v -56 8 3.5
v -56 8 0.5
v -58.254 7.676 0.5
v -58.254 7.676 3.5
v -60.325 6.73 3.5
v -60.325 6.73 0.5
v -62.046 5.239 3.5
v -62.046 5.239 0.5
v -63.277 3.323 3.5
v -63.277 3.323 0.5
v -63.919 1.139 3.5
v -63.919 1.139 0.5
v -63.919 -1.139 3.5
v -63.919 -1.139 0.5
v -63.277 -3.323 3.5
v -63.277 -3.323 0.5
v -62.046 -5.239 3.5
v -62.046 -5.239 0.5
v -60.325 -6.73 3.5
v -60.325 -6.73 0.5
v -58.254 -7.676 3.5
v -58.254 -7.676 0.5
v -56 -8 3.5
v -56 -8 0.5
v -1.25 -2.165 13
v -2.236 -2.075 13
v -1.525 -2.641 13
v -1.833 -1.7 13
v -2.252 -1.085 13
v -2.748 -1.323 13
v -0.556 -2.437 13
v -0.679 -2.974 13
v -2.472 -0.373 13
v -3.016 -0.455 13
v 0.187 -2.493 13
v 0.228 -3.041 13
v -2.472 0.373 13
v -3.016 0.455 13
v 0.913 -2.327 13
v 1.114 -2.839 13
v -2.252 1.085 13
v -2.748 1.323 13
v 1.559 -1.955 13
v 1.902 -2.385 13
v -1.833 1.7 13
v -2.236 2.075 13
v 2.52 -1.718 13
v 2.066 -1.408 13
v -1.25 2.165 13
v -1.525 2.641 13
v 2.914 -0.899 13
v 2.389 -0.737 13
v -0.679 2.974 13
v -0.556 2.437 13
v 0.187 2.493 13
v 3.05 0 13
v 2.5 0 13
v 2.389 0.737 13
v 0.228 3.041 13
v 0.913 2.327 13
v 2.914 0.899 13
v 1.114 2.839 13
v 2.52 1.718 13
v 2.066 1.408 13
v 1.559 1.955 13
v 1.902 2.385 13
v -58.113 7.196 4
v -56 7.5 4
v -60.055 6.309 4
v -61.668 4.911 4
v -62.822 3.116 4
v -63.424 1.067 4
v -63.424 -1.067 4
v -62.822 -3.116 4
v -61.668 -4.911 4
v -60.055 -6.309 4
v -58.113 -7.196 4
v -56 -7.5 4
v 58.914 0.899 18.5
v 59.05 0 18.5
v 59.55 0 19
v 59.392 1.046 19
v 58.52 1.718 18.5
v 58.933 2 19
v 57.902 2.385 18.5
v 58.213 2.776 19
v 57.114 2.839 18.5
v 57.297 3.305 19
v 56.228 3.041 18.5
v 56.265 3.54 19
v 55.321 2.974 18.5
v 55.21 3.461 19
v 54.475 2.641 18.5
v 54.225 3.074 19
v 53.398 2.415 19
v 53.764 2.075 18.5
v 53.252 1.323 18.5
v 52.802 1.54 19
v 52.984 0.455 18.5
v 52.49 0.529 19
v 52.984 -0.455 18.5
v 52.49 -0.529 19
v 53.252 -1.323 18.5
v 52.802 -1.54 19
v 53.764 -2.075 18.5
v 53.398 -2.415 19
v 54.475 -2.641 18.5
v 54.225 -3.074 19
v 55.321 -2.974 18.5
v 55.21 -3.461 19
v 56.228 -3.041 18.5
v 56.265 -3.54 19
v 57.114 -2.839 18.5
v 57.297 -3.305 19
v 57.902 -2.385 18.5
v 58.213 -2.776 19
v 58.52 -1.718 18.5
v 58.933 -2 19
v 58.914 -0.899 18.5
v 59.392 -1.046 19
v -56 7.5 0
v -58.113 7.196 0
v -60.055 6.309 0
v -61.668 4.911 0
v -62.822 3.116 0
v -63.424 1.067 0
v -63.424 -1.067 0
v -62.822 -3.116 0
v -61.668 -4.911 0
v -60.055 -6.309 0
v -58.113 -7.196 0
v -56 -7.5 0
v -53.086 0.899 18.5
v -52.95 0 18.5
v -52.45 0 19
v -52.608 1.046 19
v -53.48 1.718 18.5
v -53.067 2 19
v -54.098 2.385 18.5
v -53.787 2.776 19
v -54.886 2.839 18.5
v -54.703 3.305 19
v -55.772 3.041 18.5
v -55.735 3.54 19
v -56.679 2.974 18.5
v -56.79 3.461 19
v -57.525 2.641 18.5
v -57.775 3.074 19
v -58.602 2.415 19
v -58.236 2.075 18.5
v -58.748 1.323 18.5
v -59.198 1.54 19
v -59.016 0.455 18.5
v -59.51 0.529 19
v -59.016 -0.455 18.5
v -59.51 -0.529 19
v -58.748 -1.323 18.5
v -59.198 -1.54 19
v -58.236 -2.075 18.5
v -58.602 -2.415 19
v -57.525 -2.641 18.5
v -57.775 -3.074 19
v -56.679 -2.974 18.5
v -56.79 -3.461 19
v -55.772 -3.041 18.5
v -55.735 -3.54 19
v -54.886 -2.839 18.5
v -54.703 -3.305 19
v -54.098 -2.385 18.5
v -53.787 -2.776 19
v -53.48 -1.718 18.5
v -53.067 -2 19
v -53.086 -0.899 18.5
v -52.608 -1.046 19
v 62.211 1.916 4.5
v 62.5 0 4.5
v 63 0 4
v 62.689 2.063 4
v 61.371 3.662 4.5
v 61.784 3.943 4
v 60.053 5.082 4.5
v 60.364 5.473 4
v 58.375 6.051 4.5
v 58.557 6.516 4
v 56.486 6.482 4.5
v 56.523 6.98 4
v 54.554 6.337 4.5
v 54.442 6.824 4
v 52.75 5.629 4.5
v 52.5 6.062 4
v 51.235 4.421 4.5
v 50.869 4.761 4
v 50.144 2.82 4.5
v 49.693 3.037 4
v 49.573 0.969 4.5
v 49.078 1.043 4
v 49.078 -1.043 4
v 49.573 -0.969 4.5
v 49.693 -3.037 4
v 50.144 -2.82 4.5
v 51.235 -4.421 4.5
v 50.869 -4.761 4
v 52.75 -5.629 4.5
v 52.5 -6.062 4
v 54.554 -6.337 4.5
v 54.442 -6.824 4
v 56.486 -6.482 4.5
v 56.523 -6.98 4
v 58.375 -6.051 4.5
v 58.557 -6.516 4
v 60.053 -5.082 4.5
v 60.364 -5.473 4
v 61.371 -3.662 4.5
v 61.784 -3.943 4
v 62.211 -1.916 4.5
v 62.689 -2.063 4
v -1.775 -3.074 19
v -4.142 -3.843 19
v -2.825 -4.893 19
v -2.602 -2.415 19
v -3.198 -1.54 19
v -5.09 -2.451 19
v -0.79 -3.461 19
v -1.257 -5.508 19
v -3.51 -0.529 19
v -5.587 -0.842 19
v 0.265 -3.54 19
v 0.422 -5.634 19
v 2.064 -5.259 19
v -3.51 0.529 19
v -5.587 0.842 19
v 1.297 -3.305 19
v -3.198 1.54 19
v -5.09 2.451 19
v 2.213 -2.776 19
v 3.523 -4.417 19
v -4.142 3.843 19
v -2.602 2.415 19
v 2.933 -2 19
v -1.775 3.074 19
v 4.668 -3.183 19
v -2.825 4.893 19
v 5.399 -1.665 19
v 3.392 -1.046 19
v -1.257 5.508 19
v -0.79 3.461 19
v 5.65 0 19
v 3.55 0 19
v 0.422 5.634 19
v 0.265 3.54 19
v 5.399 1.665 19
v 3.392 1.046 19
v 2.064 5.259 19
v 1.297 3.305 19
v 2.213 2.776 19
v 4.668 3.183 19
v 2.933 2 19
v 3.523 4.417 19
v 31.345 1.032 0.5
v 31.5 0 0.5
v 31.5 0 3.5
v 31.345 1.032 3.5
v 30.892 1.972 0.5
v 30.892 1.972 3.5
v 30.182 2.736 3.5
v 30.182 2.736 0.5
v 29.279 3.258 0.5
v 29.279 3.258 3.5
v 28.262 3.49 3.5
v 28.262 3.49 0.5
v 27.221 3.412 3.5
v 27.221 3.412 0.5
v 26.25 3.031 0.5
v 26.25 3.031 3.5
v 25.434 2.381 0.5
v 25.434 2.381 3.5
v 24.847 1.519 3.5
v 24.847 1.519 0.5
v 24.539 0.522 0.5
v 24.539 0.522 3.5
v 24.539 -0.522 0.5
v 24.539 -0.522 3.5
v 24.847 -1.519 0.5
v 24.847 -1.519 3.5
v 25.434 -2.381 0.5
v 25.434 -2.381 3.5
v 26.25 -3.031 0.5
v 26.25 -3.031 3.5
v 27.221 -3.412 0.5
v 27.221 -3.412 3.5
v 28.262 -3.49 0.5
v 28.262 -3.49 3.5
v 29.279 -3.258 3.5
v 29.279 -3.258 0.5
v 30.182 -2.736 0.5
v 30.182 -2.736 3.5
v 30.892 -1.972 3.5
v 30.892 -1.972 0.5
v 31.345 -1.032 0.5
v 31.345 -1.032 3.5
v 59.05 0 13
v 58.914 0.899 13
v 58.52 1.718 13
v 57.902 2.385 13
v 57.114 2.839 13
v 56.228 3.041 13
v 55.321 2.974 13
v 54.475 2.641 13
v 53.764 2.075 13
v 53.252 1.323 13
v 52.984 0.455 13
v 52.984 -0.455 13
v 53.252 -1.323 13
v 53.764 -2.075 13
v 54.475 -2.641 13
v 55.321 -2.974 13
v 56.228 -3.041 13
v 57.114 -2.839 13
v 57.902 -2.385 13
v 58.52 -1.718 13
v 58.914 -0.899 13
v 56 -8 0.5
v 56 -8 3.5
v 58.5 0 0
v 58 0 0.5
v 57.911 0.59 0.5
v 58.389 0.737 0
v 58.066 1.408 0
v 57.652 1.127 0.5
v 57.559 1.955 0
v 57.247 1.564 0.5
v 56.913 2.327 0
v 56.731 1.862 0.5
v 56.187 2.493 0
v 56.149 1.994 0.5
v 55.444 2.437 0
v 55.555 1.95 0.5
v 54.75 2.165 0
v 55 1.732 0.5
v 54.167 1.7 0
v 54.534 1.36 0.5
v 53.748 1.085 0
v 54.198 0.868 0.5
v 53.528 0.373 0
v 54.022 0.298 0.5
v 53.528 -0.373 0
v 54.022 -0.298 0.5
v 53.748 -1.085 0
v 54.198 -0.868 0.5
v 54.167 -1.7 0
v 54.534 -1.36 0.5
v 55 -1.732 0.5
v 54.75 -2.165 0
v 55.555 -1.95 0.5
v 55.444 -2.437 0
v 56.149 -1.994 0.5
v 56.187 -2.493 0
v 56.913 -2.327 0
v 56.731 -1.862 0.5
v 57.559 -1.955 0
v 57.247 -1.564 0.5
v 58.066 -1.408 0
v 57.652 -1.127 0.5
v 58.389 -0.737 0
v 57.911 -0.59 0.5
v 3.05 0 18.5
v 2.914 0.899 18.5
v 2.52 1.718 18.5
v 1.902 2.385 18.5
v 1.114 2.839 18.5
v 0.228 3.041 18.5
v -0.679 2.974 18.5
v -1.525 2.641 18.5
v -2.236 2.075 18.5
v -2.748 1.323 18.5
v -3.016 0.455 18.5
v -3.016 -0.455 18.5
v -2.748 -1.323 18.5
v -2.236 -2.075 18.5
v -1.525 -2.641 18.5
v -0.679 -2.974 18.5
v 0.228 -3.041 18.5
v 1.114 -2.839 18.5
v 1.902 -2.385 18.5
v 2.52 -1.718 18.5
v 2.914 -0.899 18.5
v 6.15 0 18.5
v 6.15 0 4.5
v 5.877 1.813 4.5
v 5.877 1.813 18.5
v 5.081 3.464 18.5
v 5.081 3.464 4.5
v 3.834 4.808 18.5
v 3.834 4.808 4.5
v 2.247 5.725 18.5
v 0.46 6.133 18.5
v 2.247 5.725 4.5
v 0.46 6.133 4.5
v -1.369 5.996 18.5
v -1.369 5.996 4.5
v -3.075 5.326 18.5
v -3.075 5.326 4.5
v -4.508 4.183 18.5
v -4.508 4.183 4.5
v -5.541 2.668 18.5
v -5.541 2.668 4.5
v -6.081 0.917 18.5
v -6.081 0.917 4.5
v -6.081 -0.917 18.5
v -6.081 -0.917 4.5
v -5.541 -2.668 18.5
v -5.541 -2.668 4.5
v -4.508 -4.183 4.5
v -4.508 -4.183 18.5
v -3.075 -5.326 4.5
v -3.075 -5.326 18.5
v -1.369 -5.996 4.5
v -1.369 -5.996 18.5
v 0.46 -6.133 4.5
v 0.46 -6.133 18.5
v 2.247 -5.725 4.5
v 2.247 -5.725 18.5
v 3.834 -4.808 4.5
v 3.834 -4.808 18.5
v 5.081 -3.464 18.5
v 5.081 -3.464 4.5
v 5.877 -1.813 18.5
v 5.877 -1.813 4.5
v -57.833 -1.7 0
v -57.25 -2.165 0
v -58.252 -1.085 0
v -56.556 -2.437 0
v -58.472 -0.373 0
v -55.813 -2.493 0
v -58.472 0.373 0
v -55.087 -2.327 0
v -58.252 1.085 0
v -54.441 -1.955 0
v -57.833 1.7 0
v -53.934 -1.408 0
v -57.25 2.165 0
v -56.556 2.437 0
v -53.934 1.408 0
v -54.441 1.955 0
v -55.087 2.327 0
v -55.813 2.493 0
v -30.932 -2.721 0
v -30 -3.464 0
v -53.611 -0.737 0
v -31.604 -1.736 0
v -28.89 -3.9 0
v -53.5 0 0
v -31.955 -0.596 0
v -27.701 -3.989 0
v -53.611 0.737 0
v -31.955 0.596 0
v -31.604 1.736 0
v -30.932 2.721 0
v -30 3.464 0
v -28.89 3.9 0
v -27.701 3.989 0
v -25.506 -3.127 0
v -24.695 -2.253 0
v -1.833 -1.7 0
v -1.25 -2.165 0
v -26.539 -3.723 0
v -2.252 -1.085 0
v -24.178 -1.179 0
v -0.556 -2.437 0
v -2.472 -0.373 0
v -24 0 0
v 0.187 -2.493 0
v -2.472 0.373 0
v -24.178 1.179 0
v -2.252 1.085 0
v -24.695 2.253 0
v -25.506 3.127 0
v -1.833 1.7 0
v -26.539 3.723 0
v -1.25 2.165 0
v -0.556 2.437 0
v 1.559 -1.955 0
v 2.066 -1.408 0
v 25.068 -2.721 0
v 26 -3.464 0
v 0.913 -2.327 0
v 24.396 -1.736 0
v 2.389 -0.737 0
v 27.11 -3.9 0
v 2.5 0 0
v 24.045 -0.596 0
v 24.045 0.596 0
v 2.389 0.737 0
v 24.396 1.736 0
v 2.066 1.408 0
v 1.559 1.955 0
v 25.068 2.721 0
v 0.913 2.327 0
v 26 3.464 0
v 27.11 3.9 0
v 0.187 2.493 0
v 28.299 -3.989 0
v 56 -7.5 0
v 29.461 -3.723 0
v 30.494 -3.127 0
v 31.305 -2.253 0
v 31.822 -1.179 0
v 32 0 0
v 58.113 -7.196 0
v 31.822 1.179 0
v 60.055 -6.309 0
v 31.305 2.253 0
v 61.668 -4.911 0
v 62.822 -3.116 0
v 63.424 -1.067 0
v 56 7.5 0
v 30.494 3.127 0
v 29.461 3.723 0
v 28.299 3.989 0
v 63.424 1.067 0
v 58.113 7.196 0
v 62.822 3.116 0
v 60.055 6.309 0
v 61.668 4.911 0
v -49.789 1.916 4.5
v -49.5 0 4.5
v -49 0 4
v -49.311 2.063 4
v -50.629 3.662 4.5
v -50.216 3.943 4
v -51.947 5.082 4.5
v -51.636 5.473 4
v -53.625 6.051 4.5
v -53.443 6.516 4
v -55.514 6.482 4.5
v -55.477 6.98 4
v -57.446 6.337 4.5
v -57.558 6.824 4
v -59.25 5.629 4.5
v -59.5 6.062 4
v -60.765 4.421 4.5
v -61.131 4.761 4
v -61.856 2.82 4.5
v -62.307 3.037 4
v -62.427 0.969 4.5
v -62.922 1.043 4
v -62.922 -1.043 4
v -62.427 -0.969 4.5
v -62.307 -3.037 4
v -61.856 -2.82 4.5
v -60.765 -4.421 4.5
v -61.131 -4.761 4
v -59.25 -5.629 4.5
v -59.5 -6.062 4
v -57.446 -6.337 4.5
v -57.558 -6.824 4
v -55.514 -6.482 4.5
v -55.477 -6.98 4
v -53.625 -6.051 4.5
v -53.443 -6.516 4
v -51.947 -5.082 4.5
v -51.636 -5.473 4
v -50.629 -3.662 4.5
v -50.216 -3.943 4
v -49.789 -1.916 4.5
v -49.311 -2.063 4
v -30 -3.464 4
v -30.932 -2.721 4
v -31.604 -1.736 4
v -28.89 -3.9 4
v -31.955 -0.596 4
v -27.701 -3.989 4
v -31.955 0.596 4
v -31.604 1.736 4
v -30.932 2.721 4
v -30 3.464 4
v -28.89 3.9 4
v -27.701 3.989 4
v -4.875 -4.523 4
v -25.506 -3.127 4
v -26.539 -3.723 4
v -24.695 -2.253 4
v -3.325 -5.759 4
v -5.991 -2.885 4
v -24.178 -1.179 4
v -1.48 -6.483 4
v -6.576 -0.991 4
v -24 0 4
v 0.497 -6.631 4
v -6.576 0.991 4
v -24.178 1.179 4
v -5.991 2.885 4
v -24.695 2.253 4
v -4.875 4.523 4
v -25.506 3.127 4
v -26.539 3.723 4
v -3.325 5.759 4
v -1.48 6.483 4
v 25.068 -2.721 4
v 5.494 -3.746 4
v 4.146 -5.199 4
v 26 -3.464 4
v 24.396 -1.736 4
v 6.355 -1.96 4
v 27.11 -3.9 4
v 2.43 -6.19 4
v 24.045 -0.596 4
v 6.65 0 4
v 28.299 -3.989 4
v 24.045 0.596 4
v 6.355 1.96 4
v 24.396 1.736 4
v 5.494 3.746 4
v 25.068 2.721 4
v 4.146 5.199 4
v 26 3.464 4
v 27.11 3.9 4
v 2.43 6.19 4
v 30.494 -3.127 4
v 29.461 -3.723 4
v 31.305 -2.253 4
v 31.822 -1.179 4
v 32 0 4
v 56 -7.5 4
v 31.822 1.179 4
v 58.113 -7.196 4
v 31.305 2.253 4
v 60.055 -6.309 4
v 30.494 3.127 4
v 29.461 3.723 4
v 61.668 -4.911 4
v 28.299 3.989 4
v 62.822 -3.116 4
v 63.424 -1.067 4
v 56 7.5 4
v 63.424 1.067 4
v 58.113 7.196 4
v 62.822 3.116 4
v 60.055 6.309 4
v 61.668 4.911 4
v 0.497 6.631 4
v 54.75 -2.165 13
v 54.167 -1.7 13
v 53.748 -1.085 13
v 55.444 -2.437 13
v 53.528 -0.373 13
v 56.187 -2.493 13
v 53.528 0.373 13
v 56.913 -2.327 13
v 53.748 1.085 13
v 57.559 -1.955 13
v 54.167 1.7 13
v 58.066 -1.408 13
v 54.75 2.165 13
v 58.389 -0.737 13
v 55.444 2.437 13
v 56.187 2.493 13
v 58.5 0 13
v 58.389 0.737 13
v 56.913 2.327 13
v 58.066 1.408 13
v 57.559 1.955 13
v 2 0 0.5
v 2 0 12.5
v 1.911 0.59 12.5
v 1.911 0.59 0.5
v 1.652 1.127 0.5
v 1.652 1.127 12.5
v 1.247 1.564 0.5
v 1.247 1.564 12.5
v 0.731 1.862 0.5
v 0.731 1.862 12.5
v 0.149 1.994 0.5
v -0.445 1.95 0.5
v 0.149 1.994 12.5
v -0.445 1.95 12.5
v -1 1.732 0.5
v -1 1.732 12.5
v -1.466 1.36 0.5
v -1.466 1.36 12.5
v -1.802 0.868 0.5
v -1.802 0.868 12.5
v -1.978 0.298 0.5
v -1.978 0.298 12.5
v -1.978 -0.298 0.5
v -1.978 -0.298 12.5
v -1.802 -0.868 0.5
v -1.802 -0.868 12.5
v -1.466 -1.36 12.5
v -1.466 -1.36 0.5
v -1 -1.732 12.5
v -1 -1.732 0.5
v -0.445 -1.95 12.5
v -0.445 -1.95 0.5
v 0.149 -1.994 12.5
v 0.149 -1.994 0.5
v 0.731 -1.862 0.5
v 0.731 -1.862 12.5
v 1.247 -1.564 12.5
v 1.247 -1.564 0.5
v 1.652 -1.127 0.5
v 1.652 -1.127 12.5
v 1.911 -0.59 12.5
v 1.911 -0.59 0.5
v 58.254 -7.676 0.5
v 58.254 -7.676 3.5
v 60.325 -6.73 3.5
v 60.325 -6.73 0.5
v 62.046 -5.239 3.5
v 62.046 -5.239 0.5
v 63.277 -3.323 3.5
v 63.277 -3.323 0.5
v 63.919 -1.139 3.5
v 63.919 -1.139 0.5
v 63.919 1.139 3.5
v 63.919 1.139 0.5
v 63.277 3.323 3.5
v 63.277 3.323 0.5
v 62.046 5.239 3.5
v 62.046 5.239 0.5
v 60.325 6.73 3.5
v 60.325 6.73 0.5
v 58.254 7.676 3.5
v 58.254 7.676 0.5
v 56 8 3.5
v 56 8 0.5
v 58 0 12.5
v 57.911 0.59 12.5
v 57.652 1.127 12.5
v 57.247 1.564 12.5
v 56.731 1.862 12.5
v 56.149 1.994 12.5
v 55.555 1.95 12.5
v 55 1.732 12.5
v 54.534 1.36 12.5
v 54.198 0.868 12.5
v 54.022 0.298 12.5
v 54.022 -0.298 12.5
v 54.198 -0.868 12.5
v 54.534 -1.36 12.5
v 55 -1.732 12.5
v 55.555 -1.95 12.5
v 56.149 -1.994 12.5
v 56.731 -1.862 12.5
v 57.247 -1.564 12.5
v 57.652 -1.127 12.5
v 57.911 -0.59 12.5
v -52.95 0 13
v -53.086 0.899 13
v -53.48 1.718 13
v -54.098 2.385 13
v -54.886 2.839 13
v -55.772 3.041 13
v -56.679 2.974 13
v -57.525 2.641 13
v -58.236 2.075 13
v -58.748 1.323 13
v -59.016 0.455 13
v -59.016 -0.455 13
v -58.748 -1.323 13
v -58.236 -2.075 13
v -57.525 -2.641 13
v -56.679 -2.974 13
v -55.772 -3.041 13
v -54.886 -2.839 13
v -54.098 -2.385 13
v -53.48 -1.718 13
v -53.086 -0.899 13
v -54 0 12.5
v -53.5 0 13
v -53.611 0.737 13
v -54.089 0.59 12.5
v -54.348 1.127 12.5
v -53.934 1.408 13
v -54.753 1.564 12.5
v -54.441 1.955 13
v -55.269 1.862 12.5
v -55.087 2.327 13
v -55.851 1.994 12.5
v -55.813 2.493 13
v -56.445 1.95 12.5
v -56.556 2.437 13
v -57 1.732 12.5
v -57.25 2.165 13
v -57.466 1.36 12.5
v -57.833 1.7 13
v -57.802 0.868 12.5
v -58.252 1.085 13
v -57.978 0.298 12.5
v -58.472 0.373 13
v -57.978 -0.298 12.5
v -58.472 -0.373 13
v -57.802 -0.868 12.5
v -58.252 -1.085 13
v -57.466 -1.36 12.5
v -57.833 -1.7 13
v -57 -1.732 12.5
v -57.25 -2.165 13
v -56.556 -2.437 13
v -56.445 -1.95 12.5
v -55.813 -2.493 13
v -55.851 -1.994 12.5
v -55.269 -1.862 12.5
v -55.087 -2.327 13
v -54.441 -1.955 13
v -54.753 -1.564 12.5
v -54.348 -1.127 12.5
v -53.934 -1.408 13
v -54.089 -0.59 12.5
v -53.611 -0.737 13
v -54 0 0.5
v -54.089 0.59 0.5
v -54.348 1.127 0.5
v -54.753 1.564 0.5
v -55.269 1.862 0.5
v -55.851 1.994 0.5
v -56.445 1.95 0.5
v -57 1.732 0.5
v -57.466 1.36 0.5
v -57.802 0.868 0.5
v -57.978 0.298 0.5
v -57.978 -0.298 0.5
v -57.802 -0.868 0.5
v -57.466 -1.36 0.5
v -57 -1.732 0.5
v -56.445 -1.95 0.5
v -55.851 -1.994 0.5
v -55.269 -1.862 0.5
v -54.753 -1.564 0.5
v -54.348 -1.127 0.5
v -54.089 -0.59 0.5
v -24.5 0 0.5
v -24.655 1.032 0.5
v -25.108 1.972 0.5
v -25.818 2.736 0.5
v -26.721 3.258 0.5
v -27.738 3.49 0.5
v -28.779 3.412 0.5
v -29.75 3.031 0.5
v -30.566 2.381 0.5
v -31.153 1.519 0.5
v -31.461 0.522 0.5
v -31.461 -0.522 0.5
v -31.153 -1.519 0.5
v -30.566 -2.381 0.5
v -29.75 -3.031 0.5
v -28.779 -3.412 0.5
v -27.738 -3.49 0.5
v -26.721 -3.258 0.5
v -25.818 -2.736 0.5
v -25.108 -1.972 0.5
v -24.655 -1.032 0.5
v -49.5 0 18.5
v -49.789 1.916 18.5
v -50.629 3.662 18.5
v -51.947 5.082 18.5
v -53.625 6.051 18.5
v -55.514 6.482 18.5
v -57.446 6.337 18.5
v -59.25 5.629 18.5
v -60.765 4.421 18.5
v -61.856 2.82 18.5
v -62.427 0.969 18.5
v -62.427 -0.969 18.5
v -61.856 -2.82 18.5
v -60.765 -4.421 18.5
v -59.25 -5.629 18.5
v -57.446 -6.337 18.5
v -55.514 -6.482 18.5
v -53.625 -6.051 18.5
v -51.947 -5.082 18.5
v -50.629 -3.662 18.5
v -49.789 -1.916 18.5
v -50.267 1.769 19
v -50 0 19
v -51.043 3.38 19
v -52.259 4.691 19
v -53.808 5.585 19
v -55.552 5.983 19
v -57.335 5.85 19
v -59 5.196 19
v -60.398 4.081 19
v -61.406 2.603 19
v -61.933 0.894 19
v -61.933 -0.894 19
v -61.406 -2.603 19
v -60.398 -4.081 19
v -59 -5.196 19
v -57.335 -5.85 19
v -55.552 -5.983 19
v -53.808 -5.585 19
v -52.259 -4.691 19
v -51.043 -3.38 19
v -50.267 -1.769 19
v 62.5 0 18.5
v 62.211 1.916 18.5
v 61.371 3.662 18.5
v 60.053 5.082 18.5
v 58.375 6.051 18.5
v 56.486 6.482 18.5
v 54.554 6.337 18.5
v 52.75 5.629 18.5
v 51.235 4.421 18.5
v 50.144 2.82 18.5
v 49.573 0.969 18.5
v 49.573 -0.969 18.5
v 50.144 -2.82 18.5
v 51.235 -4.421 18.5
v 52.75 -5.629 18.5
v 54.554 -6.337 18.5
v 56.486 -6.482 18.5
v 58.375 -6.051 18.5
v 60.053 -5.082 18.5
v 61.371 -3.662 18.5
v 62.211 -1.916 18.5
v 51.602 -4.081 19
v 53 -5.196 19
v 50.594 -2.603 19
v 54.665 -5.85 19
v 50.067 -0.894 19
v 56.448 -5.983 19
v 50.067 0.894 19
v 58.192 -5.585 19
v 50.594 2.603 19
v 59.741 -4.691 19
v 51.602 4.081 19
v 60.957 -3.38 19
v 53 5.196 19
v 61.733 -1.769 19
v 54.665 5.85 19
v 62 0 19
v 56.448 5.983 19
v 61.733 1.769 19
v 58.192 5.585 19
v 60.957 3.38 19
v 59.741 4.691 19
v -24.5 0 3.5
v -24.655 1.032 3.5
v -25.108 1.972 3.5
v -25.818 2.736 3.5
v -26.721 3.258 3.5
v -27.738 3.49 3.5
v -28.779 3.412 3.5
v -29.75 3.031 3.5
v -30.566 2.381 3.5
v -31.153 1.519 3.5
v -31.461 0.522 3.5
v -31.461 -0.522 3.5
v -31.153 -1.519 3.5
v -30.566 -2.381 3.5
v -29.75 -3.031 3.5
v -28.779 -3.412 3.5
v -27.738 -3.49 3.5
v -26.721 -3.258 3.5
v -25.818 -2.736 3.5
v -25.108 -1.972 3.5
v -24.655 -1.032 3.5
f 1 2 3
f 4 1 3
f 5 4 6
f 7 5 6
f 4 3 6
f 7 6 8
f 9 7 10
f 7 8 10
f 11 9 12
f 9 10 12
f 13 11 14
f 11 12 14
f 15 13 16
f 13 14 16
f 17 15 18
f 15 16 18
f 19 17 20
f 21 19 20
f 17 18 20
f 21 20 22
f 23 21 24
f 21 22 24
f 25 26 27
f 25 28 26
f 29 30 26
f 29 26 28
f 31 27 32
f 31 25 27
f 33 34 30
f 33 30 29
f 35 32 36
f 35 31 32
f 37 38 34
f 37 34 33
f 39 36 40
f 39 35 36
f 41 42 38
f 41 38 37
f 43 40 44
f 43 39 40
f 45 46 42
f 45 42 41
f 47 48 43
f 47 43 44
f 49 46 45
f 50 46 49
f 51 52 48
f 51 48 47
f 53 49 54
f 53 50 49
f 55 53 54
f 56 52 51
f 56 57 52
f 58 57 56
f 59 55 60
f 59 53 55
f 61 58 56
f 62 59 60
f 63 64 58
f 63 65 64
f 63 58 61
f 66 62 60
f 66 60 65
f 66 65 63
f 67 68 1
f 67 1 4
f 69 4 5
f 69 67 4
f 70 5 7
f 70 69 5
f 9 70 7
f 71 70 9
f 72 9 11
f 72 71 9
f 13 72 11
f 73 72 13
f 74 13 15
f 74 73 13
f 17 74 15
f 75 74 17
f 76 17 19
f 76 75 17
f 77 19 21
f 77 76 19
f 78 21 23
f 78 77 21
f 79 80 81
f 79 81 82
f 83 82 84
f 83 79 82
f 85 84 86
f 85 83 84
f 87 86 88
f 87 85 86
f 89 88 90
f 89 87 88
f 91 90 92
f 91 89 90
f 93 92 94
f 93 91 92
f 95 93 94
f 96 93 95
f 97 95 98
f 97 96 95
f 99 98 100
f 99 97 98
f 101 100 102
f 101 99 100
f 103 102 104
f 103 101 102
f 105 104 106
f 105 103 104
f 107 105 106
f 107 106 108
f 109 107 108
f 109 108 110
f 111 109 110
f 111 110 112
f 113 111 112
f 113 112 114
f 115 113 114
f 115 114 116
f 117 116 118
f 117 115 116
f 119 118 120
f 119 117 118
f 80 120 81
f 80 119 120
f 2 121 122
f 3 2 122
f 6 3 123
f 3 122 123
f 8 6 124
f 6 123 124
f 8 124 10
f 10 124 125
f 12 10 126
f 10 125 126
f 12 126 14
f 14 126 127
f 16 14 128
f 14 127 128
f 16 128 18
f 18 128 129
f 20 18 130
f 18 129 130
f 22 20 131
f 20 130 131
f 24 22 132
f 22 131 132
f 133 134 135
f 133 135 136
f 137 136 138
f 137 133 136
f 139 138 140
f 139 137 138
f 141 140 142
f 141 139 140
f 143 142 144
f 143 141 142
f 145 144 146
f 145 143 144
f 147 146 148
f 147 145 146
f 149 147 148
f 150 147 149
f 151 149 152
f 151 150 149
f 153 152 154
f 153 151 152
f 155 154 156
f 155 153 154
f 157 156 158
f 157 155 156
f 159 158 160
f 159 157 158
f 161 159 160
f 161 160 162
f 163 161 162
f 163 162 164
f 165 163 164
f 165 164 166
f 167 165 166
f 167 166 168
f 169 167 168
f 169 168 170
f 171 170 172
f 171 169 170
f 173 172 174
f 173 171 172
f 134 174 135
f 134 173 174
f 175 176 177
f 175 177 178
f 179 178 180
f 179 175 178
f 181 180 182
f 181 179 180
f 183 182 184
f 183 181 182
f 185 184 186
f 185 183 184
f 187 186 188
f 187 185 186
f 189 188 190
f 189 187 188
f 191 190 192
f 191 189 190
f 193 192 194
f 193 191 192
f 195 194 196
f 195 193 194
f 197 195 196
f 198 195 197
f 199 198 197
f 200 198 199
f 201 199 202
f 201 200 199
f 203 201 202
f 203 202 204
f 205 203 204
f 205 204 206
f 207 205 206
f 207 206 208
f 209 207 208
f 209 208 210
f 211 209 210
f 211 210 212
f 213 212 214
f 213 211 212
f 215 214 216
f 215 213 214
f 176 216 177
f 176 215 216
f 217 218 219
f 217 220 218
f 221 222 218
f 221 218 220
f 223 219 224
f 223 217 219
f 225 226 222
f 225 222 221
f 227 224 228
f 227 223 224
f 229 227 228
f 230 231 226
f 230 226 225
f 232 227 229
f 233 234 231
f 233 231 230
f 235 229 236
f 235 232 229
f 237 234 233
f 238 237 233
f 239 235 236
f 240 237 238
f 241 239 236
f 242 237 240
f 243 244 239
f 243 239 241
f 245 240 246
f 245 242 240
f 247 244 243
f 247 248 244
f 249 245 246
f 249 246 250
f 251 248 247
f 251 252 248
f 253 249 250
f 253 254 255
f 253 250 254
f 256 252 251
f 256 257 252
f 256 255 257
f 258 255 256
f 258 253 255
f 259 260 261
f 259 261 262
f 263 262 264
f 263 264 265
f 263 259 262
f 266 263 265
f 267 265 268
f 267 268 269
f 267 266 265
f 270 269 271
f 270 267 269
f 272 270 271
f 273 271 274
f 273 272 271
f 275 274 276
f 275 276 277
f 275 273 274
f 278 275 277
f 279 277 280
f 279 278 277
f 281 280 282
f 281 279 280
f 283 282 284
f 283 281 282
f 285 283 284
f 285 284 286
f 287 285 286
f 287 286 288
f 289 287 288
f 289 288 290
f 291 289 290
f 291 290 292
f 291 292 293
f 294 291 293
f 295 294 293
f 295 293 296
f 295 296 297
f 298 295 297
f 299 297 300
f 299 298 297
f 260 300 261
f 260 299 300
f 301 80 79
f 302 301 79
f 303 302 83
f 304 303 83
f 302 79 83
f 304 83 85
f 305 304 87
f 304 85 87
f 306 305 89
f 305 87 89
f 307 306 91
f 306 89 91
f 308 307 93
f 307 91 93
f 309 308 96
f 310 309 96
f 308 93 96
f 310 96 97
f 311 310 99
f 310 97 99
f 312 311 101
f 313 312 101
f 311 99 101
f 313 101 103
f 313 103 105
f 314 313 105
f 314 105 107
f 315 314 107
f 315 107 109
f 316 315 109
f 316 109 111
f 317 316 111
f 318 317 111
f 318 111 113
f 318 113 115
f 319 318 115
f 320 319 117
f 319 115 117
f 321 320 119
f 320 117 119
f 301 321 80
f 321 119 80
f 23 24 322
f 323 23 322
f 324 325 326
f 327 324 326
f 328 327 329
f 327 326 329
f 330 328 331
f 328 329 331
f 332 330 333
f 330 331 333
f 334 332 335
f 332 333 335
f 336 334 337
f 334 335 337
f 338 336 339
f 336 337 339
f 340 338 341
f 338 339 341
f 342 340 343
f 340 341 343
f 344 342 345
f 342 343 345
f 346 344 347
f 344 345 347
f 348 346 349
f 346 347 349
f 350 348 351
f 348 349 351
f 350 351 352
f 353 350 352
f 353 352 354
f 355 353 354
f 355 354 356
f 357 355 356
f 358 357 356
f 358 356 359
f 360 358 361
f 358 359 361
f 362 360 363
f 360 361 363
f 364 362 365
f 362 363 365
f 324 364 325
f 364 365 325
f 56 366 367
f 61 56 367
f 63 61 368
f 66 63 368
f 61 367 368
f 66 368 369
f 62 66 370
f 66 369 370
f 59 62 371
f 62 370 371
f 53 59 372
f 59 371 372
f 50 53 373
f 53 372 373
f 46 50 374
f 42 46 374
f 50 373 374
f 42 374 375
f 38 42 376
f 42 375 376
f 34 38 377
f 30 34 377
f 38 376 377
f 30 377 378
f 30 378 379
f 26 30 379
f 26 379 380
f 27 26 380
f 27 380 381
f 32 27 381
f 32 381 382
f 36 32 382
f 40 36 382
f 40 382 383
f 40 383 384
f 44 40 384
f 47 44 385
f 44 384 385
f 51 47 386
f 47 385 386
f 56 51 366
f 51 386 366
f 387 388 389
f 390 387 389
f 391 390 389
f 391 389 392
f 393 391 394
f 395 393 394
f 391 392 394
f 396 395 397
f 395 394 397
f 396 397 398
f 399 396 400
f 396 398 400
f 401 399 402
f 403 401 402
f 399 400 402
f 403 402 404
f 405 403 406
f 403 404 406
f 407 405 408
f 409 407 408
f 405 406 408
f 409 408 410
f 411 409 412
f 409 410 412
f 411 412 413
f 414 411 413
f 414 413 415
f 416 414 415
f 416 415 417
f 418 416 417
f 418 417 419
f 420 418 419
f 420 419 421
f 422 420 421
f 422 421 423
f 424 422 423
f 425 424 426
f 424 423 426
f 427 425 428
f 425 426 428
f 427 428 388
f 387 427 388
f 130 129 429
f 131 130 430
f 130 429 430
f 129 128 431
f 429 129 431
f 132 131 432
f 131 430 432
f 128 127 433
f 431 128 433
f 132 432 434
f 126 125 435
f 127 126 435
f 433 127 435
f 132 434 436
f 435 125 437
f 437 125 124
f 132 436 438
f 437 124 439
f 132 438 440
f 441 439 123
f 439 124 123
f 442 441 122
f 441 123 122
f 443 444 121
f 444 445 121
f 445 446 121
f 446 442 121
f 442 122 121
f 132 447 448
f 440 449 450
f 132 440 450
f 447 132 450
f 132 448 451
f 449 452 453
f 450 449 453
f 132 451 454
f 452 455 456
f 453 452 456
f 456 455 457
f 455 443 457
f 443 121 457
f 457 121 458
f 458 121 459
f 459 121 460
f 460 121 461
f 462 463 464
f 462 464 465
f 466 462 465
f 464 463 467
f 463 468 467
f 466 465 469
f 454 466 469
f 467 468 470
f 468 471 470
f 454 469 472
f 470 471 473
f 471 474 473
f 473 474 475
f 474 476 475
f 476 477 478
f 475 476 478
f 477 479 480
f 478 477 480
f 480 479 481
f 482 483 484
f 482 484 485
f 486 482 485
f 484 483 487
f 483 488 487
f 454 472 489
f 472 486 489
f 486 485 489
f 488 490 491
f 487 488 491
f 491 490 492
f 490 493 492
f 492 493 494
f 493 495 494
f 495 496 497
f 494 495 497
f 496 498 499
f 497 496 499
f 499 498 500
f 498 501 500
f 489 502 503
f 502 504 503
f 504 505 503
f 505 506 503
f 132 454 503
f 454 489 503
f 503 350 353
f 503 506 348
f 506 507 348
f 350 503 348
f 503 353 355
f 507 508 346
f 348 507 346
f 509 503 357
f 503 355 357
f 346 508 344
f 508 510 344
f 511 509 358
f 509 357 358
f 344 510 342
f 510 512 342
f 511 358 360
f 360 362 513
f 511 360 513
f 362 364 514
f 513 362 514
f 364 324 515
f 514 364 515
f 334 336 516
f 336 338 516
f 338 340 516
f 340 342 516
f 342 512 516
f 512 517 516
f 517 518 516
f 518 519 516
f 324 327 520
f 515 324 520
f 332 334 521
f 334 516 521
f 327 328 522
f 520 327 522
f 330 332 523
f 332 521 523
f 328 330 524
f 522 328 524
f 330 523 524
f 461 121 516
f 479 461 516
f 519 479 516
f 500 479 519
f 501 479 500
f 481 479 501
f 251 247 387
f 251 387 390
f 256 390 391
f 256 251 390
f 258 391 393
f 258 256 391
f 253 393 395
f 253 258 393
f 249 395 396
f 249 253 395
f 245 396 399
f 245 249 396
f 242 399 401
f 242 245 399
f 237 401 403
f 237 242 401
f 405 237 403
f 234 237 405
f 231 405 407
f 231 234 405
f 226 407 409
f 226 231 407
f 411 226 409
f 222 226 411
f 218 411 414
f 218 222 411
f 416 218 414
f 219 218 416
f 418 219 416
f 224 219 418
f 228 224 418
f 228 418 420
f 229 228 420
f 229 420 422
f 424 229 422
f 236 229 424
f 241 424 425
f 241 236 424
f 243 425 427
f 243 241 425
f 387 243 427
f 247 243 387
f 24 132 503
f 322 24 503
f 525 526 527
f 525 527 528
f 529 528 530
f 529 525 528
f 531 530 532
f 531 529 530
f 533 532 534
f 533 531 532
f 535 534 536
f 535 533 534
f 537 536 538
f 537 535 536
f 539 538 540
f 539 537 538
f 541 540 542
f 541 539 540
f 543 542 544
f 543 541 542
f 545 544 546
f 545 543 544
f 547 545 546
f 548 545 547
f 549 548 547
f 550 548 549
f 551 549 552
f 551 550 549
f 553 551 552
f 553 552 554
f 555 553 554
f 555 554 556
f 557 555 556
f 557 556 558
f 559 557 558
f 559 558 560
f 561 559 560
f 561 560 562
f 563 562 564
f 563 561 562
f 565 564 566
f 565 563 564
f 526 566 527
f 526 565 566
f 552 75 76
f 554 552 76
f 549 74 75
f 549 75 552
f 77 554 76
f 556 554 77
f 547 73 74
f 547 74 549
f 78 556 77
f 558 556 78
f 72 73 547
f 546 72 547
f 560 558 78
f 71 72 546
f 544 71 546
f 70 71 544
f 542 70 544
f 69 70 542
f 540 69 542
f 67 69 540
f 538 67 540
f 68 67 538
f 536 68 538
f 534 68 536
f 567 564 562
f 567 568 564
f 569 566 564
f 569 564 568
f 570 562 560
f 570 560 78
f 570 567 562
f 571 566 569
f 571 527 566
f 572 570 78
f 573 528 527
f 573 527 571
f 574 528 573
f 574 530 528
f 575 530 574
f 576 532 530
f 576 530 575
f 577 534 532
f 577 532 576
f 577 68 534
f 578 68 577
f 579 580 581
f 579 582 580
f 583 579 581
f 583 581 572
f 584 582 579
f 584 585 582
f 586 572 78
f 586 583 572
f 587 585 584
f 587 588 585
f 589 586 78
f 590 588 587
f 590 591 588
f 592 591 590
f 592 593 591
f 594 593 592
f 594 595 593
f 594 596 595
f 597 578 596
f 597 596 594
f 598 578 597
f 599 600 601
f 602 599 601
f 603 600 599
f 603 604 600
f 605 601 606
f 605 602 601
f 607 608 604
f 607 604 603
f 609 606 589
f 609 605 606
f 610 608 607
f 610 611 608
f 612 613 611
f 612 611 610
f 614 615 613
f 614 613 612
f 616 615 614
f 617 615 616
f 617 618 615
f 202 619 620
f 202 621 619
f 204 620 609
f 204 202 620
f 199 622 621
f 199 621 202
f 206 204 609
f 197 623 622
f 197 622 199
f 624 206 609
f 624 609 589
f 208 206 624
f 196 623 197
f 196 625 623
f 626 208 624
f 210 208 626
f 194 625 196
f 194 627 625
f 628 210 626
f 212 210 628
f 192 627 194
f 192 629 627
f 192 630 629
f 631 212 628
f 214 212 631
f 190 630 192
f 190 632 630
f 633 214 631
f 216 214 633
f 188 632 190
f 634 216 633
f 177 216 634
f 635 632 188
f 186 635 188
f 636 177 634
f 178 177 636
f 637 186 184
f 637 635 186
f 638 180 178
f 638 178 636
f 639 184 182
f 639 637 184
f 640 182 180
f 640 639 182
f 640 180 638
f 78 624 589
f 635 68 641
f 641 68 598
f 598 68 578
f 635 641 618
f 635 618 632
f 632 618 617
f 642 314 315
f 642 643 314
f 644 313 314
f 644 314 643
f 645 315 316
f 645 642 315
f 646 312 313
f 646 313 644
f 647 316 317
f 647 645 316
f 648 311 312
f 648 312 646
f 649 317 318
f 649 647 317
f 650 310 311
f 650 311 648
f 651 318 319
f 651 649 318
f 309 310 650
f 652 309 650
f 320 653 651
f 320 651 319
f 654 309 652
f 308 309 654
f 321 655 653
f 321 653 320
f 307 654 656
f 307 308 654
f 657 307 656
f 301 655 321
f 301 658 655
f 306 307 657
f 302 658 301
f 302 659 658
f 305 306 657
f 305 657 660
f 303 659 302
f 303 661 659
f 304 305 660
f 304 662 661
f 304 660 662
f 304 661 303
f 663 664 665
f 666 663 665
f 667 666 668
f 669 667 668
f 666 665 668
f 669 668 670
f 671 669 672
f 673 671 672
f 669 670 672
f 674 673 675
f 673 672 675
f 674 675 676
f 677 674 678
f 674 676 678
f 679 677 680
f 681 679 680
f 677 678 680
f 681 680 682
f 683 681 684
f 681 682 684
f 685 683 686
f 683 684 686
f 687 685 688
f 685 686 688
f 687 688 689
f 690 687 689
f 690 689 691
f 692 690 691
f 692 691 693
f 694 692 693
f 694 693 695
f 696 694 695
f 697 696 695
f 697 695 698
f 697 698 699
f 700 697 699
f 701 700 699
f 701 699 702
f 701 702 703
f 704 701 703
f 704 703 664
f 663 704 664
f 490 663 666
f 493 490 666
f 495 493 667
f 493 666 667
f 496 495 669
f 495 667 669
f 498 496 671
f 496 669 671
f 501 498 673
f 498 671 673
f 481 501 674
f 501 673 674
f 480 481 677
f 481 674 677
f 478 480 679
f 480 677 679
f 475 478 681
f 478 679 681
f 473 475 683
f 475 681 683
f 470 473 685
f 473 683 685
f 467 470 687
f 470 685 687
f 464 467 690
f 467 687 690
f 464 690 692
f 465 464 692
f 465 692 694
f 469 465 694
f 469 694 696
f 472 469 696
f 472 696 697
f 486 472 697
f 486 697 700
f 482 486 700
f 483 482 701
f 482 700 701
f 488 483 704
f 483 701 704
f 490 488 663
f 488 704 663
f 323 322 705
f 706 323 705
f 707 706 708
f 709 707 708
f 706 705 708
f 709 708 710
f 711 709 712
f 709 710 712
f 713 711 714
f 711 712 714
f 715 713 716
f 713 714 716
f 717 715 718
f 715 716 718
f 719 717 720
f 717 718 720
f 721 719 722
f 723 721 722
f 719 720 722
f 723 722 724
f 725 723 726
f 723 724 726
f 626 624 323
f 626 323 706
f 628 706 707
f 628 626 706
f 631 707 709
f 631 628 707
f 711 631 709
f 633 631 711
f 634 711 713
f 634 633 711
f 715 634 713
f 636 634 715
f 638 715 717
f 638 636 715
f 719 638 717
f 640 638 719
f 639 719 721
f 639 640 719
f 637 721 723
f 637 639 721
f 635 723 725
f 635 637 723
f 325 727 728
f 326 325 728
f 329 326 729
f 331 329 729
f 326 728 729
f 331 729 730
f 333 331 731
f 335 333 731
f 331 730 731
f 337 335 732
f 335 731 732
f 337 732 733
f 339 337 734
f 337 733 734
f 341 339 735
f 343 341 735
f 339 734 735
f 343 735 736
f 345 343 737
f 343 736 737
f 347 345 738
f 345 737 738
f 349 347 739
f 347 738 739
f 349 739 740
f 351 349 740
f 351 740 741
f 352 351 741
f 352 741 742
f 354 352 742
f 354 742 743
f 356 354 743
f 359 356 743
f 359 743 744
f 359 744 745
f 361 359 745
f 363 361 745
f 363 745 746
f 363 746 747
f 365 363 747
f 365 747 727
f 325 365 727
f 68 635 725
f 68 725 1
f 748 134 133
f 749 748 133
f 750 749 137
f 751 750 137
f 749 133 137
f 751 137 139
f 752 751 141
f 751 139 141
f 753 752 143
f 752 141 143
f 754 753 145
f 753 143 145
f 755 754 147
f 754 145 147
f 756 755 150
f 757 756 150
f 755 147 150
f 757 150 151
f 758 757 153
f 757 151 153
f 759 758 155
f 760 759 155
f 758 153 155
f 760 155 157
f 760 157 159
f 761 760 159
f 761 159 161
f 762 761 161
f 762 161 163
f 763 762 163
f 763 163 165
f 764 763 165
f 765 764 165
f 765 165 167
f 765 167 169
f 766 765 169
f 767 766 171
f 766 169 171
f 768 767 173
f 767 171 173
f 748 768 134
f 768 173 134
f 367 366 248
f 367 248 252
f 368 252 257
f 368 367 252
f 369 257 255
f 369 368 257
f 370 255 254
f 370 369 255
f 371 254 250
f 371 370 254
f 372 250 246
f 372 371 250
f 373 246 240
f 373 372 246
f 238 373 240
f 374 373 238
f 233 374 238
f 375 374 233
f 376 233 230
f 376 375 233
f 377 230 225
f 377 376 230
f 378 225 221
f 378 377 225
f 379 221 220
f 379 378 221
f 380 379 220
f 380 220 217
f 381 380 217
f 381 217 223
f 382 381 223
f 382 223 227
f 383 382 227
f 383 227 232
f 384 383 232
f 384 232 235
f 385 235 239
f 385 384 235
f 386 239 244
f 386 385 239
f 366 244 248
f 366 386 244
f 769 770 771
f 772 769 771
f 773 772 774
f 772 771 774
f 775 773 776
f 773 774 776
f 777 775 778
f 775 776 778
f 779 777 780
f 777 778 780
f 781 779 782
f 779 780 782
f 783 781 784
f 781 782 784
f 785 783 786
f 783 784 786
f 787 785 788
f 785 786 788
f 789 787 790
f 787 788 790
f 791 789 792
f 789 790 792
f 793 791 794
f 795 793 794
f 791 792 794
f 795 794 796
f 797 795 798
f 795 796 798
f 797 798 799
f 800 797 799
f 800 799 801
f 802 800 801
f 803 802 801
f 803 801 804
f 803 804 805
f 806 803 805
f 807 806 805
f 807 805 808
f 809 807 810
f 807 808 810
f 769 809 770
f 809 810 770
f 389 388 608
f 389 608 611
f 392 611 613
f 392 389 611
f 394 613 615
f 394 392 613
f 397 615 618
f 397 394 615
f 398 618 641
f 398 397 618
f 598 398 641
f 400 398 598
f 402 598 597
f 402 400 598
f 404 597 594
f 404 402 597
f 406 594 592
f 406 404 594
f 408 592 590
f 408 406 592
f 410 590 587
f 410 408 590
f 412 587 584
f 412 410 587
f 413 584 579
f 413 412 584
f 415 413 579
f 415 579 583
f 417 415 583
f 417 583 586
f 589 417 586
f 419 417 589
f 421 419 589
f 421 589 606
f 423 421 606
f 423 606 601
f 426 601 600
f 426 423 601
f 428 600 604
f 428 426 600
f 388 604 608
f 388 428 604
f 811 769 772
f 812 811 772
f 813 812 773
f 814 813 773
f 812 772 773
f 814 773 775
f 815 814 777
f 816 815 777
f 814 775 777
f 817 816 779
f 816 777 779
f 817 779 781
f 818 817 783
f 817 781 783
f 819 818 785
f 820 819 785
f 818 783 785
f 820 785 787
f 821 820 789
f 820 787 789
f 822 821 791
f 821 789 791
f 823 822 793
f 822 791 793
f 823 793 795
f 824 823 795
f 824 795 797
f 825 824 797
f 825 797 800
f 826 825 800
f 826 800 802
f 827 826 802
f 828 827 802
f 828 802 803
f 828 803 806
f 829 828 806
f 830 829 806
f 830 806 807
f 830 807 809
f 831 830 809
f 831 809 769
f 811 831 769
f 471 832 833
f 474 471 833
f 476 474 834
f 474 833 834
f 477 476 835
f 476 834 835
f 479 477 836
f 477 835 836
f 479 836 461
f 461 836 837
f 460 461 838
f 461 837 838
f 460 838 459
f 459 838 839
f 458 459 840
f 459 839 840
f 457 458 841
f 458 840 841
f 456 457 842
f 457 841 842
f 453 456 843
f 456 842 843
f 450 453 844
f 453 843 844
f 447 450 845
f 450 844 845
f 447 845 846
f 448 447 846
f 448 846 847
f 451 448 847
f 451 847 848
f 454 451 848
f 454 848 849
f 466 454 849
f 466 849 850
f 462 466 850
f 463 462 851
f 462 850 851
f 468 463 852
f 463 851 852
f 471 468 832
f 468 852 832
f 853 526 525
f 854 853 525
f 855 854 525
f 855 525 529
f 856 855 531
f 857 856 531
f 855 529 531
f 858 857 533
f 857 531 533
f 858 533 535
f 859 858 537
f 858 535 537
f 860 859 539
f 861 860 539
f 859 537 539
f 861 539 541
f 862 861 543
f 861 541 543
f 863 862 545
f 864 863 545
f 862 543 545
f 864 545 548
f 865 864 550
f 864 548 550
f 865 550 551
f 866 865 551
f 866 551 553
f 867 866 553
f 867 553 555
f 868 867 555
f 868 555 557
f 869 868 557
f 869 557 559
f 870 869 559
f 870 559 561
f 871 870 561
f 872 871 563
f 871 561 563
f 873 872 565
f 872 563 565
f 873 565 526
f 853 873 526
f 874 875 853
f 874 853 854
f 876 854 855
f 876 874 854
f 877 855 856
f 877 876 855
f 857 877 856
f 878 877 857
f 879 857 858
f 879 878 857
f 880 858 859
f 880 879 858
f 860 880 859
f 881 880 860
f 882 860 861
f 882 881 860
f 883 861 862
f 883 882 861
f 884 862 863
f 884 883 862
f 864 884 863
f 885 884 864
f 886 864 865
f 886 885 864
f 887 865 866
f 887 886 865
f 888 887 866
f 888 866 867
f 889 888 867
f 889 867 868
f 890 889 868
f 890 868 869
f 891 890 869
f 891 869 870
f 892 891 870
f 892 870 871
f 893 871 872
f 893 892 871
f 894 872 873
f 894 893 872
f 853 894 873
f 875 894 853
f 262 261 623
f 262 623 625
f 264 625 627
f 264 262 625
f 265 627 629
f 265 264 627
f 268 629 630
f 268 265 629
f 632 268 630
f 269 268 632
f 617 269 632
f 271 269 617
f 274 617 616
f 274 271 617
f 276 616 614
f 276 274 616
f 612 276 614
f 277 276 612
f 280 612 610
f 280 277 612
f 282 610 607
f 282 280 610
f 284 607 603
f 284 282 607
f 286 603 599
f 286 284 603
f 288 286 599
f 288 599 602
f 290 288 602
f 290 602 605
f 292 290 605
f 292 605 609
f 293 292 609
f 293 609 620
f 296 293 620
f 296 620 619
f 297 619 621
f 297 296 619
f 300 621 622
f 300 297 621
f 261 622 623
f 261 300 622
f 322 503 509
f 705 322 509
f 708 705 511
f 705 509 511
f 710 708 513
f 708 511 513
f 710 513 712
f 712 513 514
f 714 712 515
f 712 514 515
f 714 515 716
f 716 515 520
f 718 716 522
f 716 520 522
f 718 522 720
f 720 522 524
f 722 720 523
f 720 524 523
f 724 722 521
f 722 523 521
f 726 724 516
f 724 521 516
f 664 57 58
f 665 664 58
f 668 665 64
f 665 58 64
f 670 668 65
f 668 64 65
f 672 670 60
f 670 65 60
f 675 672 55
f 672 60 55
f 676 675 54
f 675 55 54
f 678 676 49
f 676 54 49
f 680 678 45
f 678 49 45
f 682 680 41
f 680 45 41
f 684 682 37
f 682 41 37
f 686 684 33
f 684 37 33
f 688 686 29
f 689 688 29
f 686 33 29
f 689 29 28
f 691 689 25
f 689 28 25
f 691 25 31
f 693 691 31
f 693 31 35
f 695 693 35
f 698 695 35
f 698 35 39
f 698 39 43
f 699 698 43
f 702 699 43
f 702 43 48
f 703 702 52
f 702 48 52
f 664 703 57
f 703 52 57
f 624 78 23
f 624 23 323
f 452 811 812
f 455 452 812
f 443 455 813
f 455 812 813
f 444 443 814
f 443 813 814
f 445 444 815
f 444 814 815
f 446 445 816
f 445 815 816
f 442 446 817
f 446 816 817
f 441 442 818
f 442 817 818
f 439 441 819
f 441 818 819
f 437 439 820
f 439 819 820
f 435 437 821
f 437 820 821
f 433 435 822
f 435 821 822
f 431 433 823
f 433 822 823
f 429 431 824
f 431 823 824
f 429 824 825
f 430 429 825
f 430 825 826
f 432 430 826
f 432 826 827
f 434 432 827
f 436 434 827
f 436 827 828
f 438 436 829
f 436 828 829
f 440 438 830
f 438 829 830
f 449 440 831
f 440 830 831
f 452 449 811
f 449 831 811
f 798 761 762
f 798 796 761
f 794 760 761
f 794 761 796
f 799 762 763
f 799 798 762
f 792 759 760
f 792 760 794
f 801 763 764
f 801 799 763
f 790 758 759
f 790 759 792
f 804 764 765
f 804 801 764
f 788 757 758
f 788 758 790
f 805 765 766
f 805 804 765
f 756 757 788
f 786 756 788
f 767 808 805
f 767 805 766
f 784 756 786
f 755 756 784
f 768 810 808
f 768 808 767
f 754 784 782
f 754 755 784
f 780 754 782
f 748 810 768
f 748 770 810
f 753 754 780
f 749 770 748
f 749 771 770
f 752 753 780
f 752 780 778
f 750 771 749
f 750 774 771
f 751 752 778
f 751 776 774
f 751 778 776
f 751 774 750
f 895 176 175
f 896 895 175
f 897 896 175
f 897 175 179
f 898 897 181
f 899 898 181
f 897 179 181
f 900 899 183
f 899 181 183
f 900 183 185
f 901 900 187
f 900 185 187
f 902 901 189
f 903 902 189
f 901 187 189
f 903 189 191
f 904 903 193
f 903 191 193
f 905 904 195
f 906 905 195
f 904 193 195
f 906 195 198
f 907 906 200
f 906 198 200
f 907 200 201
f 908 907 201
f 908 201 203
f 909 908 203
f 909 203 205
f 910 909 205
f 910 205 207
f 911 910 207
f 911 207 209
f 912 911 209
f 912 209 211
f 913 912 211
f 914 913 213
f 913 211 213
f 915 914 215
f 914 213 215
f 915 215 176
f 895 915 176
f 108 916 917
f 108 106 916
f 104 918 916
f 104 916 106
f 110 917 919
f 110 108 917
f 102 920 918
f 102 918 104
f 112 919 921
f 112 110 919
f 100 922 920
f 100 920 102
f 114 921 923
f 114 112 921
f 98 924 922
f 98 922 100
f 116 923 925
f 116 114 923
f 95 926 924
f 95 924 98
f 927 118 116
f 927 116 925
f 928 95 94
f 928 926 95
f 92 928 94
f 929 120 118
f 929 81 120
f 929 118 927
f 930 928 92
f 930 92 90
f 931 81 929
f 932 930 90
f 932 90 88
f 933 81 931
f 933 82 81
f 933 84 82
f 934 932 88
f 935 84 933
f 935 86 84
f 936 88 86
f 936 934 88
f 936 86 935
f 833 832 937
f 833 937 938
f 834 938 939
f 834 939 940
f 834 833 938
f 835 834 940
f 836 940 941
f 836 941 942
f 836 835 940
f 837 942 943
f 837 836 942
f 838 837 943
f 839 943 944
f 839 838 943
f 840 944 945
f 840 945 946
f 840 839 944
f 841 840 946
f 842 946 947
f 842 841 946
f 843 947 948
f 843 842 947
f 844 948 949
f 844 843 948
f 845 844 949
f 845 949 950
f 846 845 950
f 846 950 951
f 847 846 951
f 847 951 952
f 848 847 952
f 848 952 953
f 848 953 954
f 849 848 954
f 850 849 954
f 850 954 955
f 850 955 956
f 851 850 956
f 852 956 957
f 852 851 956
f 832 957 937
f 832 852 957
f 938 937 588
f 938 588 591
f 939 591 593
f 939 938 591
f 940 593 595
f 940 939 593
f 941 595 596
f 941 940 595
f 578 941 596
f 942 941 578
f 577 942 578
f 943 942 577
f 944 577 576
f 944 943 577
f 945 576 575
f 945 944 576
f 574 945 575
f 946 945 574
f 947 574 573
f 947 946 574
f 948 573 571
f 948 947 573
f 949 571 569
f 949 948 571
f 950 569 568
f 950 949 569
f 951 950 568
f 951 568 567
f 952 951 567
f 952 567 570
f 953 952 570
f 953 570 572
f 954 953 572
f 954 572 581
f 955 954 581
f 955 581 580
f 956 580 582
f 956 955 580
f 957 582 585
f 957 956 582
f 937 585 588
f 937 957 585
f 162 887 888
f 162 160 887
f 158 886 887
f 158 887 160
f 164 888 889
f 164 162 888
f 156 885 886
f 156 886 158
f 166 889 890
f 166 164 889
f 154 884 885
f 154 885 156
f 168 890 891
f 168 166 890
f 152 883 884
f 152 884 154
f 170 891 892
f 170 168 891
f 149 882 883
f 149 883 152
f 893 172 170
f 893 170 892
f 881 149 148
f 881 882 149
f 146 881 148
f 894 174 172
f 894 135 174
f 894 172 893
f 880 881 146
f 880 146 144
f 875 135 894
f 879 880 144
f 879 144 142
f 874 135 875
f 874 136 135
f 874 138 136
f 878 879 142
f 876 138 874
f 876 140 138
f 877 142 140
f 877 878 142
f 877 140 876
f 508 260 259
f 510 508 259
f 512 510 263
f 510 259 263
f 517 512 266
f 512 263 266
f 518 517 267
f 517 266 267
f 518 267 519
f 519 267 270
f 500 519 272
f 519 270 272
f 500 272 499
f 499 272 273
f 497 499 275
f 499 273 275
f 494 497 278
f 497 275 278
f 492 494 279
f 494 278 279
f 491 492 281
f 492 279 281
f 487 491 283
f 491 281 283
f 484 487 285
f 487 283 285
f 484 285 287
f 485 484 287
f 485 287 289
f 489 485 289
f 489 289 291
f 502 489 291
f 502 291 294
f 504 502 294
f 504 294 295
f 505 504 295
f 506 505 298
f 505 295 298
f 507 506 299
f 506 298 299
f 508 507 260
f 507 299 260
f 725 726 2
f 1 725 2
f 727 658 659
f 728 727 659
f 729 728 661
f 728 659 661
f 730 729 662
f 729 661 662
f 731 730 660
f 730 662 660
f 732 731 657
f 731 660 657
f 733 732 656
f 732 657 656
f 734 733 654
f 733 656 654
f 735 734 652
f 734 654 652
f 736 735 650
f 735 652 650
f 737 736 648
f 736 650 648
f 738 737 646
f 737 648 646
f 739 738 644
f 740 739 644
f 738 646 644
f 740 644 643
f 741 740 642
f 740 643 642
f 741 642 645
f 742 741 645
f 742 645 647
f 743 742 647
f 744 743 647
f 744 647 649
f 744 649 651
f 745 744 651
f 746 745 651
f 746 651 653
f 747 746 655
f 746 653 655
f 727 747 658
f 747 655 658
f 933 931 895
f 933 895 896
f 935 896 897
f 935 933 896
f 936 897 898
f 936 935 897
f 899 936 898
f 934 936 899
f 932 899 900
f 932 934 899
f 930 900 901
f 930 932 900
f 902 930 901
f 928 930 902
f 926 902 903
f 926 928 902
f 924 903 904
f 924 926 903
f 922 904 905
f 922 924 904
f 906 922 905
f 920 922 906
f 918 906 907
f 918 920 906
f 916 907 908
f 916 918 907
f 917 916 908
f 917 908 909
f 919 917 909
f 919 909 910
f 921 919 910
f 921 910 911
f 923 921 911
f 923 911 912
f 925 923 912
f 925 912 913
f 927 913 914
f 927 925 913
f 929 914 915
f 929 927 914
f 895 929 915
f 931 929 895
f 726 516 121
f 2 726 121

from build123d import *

# Parameters (mm, degrees)
F0_R     = 3.5
F1_DEPTH = 4
F2_R     = 6.5
F2_R_2   = 6.15
F3_DEPTH = 15
F4_R     = 2
F5_DEPTH = 25
F6_R     = 3.05
F7_DEPTH = 6
F8_SIZE  = 0.5


with BuildPart() as f1:
    # F0 (on Top) → F1 (new body)
    with BuildSketch(Plane.XY):
        with BuildLine():
            Line((-56, -8), (56, -8))
            ThreePointArc((56, -8), (64, 0), (56, 8))
            Line((56, 8), (-56, 8))
            ThreePointArc((-56, 8), (-64, 0), (-56, -8))
        make_face()
        with Locations((-28, 0)):
            Circle(F0_R, mode=Mode.SUBTRACT)
        with Locations((28, 0)):
            Circle(F0_R, mode=Mode.SUBTRACT)
    extrude(amount=F1_DEPTH)

    # F2 (on face) → F3 (join)
    with BuildSketch(Plane.XY.offset(4)):
        with Locations((-56, 0)):
            Circle(F2_R)
        with Locations((56, 0)):
            Circle(F2_R)
        Circle(F2_R_2)
    extrude(amount=F3_DEPTH)

    # F4 (on face) → F5 (cut)
    with BuildSketch(Plane.XY.offset(19)):
        with Locations((56, 0)):
            Circle(F4_R)
        Circle(F4_R)
        with Locations((-56, 0)):
            Circle(F4_R)
    extrude(amount=-F5_DEPTH, mode=Mode.SUBTRACT)

    # F6 (on face) → F7 (cut)
    with BuildSketch(Plane.XY.offset(19)):
        with Locations((-56, 0)):
            Circle(F6_R)
        Circle(F6_R)
        with Locations((56, 0)):
            Circle(F6_R)
    extrude(amount=-F7_DEPTH, mode=Mode.SUBTRACT)

    # F8
    f8_edges = [f1.edges().sort_by_distance(p)[0] for p in [
        (-62.5, 0, 19),
        (-59.05, 0, 19),
        (-6.15, 0, 19),
        (-3.05, 0, 19),
        (49.5, 0, 19),
        (52.95, 0, 19),
        (-64, 0, 4),
        (0, 8, 4),
        (0, -8, 4),
        (64, 0, 4),
        (-62.5, 0, 4),
        (-31.5, 0, 4),
        (-6.15, 0, 4),
        (24.5, 0, 4),
        (49.5, 0, 4),
        (-64, 0, 0),
        (0, 8, 0),
        (0, -8, 0),
        (64, 0, 0),
        (-58, 0, 0),
        (-31.5, 0, 0),
        (-2, 0, 0),
        (24.5, 0, 0),
        (54, 0, 0),
        (-58, 0, 13),
        (-2, 0, 13),
        (54, 0, 13),
    ]]
    chamfer(f8_edges, length=F8_SIZE)


solid = f1.part
